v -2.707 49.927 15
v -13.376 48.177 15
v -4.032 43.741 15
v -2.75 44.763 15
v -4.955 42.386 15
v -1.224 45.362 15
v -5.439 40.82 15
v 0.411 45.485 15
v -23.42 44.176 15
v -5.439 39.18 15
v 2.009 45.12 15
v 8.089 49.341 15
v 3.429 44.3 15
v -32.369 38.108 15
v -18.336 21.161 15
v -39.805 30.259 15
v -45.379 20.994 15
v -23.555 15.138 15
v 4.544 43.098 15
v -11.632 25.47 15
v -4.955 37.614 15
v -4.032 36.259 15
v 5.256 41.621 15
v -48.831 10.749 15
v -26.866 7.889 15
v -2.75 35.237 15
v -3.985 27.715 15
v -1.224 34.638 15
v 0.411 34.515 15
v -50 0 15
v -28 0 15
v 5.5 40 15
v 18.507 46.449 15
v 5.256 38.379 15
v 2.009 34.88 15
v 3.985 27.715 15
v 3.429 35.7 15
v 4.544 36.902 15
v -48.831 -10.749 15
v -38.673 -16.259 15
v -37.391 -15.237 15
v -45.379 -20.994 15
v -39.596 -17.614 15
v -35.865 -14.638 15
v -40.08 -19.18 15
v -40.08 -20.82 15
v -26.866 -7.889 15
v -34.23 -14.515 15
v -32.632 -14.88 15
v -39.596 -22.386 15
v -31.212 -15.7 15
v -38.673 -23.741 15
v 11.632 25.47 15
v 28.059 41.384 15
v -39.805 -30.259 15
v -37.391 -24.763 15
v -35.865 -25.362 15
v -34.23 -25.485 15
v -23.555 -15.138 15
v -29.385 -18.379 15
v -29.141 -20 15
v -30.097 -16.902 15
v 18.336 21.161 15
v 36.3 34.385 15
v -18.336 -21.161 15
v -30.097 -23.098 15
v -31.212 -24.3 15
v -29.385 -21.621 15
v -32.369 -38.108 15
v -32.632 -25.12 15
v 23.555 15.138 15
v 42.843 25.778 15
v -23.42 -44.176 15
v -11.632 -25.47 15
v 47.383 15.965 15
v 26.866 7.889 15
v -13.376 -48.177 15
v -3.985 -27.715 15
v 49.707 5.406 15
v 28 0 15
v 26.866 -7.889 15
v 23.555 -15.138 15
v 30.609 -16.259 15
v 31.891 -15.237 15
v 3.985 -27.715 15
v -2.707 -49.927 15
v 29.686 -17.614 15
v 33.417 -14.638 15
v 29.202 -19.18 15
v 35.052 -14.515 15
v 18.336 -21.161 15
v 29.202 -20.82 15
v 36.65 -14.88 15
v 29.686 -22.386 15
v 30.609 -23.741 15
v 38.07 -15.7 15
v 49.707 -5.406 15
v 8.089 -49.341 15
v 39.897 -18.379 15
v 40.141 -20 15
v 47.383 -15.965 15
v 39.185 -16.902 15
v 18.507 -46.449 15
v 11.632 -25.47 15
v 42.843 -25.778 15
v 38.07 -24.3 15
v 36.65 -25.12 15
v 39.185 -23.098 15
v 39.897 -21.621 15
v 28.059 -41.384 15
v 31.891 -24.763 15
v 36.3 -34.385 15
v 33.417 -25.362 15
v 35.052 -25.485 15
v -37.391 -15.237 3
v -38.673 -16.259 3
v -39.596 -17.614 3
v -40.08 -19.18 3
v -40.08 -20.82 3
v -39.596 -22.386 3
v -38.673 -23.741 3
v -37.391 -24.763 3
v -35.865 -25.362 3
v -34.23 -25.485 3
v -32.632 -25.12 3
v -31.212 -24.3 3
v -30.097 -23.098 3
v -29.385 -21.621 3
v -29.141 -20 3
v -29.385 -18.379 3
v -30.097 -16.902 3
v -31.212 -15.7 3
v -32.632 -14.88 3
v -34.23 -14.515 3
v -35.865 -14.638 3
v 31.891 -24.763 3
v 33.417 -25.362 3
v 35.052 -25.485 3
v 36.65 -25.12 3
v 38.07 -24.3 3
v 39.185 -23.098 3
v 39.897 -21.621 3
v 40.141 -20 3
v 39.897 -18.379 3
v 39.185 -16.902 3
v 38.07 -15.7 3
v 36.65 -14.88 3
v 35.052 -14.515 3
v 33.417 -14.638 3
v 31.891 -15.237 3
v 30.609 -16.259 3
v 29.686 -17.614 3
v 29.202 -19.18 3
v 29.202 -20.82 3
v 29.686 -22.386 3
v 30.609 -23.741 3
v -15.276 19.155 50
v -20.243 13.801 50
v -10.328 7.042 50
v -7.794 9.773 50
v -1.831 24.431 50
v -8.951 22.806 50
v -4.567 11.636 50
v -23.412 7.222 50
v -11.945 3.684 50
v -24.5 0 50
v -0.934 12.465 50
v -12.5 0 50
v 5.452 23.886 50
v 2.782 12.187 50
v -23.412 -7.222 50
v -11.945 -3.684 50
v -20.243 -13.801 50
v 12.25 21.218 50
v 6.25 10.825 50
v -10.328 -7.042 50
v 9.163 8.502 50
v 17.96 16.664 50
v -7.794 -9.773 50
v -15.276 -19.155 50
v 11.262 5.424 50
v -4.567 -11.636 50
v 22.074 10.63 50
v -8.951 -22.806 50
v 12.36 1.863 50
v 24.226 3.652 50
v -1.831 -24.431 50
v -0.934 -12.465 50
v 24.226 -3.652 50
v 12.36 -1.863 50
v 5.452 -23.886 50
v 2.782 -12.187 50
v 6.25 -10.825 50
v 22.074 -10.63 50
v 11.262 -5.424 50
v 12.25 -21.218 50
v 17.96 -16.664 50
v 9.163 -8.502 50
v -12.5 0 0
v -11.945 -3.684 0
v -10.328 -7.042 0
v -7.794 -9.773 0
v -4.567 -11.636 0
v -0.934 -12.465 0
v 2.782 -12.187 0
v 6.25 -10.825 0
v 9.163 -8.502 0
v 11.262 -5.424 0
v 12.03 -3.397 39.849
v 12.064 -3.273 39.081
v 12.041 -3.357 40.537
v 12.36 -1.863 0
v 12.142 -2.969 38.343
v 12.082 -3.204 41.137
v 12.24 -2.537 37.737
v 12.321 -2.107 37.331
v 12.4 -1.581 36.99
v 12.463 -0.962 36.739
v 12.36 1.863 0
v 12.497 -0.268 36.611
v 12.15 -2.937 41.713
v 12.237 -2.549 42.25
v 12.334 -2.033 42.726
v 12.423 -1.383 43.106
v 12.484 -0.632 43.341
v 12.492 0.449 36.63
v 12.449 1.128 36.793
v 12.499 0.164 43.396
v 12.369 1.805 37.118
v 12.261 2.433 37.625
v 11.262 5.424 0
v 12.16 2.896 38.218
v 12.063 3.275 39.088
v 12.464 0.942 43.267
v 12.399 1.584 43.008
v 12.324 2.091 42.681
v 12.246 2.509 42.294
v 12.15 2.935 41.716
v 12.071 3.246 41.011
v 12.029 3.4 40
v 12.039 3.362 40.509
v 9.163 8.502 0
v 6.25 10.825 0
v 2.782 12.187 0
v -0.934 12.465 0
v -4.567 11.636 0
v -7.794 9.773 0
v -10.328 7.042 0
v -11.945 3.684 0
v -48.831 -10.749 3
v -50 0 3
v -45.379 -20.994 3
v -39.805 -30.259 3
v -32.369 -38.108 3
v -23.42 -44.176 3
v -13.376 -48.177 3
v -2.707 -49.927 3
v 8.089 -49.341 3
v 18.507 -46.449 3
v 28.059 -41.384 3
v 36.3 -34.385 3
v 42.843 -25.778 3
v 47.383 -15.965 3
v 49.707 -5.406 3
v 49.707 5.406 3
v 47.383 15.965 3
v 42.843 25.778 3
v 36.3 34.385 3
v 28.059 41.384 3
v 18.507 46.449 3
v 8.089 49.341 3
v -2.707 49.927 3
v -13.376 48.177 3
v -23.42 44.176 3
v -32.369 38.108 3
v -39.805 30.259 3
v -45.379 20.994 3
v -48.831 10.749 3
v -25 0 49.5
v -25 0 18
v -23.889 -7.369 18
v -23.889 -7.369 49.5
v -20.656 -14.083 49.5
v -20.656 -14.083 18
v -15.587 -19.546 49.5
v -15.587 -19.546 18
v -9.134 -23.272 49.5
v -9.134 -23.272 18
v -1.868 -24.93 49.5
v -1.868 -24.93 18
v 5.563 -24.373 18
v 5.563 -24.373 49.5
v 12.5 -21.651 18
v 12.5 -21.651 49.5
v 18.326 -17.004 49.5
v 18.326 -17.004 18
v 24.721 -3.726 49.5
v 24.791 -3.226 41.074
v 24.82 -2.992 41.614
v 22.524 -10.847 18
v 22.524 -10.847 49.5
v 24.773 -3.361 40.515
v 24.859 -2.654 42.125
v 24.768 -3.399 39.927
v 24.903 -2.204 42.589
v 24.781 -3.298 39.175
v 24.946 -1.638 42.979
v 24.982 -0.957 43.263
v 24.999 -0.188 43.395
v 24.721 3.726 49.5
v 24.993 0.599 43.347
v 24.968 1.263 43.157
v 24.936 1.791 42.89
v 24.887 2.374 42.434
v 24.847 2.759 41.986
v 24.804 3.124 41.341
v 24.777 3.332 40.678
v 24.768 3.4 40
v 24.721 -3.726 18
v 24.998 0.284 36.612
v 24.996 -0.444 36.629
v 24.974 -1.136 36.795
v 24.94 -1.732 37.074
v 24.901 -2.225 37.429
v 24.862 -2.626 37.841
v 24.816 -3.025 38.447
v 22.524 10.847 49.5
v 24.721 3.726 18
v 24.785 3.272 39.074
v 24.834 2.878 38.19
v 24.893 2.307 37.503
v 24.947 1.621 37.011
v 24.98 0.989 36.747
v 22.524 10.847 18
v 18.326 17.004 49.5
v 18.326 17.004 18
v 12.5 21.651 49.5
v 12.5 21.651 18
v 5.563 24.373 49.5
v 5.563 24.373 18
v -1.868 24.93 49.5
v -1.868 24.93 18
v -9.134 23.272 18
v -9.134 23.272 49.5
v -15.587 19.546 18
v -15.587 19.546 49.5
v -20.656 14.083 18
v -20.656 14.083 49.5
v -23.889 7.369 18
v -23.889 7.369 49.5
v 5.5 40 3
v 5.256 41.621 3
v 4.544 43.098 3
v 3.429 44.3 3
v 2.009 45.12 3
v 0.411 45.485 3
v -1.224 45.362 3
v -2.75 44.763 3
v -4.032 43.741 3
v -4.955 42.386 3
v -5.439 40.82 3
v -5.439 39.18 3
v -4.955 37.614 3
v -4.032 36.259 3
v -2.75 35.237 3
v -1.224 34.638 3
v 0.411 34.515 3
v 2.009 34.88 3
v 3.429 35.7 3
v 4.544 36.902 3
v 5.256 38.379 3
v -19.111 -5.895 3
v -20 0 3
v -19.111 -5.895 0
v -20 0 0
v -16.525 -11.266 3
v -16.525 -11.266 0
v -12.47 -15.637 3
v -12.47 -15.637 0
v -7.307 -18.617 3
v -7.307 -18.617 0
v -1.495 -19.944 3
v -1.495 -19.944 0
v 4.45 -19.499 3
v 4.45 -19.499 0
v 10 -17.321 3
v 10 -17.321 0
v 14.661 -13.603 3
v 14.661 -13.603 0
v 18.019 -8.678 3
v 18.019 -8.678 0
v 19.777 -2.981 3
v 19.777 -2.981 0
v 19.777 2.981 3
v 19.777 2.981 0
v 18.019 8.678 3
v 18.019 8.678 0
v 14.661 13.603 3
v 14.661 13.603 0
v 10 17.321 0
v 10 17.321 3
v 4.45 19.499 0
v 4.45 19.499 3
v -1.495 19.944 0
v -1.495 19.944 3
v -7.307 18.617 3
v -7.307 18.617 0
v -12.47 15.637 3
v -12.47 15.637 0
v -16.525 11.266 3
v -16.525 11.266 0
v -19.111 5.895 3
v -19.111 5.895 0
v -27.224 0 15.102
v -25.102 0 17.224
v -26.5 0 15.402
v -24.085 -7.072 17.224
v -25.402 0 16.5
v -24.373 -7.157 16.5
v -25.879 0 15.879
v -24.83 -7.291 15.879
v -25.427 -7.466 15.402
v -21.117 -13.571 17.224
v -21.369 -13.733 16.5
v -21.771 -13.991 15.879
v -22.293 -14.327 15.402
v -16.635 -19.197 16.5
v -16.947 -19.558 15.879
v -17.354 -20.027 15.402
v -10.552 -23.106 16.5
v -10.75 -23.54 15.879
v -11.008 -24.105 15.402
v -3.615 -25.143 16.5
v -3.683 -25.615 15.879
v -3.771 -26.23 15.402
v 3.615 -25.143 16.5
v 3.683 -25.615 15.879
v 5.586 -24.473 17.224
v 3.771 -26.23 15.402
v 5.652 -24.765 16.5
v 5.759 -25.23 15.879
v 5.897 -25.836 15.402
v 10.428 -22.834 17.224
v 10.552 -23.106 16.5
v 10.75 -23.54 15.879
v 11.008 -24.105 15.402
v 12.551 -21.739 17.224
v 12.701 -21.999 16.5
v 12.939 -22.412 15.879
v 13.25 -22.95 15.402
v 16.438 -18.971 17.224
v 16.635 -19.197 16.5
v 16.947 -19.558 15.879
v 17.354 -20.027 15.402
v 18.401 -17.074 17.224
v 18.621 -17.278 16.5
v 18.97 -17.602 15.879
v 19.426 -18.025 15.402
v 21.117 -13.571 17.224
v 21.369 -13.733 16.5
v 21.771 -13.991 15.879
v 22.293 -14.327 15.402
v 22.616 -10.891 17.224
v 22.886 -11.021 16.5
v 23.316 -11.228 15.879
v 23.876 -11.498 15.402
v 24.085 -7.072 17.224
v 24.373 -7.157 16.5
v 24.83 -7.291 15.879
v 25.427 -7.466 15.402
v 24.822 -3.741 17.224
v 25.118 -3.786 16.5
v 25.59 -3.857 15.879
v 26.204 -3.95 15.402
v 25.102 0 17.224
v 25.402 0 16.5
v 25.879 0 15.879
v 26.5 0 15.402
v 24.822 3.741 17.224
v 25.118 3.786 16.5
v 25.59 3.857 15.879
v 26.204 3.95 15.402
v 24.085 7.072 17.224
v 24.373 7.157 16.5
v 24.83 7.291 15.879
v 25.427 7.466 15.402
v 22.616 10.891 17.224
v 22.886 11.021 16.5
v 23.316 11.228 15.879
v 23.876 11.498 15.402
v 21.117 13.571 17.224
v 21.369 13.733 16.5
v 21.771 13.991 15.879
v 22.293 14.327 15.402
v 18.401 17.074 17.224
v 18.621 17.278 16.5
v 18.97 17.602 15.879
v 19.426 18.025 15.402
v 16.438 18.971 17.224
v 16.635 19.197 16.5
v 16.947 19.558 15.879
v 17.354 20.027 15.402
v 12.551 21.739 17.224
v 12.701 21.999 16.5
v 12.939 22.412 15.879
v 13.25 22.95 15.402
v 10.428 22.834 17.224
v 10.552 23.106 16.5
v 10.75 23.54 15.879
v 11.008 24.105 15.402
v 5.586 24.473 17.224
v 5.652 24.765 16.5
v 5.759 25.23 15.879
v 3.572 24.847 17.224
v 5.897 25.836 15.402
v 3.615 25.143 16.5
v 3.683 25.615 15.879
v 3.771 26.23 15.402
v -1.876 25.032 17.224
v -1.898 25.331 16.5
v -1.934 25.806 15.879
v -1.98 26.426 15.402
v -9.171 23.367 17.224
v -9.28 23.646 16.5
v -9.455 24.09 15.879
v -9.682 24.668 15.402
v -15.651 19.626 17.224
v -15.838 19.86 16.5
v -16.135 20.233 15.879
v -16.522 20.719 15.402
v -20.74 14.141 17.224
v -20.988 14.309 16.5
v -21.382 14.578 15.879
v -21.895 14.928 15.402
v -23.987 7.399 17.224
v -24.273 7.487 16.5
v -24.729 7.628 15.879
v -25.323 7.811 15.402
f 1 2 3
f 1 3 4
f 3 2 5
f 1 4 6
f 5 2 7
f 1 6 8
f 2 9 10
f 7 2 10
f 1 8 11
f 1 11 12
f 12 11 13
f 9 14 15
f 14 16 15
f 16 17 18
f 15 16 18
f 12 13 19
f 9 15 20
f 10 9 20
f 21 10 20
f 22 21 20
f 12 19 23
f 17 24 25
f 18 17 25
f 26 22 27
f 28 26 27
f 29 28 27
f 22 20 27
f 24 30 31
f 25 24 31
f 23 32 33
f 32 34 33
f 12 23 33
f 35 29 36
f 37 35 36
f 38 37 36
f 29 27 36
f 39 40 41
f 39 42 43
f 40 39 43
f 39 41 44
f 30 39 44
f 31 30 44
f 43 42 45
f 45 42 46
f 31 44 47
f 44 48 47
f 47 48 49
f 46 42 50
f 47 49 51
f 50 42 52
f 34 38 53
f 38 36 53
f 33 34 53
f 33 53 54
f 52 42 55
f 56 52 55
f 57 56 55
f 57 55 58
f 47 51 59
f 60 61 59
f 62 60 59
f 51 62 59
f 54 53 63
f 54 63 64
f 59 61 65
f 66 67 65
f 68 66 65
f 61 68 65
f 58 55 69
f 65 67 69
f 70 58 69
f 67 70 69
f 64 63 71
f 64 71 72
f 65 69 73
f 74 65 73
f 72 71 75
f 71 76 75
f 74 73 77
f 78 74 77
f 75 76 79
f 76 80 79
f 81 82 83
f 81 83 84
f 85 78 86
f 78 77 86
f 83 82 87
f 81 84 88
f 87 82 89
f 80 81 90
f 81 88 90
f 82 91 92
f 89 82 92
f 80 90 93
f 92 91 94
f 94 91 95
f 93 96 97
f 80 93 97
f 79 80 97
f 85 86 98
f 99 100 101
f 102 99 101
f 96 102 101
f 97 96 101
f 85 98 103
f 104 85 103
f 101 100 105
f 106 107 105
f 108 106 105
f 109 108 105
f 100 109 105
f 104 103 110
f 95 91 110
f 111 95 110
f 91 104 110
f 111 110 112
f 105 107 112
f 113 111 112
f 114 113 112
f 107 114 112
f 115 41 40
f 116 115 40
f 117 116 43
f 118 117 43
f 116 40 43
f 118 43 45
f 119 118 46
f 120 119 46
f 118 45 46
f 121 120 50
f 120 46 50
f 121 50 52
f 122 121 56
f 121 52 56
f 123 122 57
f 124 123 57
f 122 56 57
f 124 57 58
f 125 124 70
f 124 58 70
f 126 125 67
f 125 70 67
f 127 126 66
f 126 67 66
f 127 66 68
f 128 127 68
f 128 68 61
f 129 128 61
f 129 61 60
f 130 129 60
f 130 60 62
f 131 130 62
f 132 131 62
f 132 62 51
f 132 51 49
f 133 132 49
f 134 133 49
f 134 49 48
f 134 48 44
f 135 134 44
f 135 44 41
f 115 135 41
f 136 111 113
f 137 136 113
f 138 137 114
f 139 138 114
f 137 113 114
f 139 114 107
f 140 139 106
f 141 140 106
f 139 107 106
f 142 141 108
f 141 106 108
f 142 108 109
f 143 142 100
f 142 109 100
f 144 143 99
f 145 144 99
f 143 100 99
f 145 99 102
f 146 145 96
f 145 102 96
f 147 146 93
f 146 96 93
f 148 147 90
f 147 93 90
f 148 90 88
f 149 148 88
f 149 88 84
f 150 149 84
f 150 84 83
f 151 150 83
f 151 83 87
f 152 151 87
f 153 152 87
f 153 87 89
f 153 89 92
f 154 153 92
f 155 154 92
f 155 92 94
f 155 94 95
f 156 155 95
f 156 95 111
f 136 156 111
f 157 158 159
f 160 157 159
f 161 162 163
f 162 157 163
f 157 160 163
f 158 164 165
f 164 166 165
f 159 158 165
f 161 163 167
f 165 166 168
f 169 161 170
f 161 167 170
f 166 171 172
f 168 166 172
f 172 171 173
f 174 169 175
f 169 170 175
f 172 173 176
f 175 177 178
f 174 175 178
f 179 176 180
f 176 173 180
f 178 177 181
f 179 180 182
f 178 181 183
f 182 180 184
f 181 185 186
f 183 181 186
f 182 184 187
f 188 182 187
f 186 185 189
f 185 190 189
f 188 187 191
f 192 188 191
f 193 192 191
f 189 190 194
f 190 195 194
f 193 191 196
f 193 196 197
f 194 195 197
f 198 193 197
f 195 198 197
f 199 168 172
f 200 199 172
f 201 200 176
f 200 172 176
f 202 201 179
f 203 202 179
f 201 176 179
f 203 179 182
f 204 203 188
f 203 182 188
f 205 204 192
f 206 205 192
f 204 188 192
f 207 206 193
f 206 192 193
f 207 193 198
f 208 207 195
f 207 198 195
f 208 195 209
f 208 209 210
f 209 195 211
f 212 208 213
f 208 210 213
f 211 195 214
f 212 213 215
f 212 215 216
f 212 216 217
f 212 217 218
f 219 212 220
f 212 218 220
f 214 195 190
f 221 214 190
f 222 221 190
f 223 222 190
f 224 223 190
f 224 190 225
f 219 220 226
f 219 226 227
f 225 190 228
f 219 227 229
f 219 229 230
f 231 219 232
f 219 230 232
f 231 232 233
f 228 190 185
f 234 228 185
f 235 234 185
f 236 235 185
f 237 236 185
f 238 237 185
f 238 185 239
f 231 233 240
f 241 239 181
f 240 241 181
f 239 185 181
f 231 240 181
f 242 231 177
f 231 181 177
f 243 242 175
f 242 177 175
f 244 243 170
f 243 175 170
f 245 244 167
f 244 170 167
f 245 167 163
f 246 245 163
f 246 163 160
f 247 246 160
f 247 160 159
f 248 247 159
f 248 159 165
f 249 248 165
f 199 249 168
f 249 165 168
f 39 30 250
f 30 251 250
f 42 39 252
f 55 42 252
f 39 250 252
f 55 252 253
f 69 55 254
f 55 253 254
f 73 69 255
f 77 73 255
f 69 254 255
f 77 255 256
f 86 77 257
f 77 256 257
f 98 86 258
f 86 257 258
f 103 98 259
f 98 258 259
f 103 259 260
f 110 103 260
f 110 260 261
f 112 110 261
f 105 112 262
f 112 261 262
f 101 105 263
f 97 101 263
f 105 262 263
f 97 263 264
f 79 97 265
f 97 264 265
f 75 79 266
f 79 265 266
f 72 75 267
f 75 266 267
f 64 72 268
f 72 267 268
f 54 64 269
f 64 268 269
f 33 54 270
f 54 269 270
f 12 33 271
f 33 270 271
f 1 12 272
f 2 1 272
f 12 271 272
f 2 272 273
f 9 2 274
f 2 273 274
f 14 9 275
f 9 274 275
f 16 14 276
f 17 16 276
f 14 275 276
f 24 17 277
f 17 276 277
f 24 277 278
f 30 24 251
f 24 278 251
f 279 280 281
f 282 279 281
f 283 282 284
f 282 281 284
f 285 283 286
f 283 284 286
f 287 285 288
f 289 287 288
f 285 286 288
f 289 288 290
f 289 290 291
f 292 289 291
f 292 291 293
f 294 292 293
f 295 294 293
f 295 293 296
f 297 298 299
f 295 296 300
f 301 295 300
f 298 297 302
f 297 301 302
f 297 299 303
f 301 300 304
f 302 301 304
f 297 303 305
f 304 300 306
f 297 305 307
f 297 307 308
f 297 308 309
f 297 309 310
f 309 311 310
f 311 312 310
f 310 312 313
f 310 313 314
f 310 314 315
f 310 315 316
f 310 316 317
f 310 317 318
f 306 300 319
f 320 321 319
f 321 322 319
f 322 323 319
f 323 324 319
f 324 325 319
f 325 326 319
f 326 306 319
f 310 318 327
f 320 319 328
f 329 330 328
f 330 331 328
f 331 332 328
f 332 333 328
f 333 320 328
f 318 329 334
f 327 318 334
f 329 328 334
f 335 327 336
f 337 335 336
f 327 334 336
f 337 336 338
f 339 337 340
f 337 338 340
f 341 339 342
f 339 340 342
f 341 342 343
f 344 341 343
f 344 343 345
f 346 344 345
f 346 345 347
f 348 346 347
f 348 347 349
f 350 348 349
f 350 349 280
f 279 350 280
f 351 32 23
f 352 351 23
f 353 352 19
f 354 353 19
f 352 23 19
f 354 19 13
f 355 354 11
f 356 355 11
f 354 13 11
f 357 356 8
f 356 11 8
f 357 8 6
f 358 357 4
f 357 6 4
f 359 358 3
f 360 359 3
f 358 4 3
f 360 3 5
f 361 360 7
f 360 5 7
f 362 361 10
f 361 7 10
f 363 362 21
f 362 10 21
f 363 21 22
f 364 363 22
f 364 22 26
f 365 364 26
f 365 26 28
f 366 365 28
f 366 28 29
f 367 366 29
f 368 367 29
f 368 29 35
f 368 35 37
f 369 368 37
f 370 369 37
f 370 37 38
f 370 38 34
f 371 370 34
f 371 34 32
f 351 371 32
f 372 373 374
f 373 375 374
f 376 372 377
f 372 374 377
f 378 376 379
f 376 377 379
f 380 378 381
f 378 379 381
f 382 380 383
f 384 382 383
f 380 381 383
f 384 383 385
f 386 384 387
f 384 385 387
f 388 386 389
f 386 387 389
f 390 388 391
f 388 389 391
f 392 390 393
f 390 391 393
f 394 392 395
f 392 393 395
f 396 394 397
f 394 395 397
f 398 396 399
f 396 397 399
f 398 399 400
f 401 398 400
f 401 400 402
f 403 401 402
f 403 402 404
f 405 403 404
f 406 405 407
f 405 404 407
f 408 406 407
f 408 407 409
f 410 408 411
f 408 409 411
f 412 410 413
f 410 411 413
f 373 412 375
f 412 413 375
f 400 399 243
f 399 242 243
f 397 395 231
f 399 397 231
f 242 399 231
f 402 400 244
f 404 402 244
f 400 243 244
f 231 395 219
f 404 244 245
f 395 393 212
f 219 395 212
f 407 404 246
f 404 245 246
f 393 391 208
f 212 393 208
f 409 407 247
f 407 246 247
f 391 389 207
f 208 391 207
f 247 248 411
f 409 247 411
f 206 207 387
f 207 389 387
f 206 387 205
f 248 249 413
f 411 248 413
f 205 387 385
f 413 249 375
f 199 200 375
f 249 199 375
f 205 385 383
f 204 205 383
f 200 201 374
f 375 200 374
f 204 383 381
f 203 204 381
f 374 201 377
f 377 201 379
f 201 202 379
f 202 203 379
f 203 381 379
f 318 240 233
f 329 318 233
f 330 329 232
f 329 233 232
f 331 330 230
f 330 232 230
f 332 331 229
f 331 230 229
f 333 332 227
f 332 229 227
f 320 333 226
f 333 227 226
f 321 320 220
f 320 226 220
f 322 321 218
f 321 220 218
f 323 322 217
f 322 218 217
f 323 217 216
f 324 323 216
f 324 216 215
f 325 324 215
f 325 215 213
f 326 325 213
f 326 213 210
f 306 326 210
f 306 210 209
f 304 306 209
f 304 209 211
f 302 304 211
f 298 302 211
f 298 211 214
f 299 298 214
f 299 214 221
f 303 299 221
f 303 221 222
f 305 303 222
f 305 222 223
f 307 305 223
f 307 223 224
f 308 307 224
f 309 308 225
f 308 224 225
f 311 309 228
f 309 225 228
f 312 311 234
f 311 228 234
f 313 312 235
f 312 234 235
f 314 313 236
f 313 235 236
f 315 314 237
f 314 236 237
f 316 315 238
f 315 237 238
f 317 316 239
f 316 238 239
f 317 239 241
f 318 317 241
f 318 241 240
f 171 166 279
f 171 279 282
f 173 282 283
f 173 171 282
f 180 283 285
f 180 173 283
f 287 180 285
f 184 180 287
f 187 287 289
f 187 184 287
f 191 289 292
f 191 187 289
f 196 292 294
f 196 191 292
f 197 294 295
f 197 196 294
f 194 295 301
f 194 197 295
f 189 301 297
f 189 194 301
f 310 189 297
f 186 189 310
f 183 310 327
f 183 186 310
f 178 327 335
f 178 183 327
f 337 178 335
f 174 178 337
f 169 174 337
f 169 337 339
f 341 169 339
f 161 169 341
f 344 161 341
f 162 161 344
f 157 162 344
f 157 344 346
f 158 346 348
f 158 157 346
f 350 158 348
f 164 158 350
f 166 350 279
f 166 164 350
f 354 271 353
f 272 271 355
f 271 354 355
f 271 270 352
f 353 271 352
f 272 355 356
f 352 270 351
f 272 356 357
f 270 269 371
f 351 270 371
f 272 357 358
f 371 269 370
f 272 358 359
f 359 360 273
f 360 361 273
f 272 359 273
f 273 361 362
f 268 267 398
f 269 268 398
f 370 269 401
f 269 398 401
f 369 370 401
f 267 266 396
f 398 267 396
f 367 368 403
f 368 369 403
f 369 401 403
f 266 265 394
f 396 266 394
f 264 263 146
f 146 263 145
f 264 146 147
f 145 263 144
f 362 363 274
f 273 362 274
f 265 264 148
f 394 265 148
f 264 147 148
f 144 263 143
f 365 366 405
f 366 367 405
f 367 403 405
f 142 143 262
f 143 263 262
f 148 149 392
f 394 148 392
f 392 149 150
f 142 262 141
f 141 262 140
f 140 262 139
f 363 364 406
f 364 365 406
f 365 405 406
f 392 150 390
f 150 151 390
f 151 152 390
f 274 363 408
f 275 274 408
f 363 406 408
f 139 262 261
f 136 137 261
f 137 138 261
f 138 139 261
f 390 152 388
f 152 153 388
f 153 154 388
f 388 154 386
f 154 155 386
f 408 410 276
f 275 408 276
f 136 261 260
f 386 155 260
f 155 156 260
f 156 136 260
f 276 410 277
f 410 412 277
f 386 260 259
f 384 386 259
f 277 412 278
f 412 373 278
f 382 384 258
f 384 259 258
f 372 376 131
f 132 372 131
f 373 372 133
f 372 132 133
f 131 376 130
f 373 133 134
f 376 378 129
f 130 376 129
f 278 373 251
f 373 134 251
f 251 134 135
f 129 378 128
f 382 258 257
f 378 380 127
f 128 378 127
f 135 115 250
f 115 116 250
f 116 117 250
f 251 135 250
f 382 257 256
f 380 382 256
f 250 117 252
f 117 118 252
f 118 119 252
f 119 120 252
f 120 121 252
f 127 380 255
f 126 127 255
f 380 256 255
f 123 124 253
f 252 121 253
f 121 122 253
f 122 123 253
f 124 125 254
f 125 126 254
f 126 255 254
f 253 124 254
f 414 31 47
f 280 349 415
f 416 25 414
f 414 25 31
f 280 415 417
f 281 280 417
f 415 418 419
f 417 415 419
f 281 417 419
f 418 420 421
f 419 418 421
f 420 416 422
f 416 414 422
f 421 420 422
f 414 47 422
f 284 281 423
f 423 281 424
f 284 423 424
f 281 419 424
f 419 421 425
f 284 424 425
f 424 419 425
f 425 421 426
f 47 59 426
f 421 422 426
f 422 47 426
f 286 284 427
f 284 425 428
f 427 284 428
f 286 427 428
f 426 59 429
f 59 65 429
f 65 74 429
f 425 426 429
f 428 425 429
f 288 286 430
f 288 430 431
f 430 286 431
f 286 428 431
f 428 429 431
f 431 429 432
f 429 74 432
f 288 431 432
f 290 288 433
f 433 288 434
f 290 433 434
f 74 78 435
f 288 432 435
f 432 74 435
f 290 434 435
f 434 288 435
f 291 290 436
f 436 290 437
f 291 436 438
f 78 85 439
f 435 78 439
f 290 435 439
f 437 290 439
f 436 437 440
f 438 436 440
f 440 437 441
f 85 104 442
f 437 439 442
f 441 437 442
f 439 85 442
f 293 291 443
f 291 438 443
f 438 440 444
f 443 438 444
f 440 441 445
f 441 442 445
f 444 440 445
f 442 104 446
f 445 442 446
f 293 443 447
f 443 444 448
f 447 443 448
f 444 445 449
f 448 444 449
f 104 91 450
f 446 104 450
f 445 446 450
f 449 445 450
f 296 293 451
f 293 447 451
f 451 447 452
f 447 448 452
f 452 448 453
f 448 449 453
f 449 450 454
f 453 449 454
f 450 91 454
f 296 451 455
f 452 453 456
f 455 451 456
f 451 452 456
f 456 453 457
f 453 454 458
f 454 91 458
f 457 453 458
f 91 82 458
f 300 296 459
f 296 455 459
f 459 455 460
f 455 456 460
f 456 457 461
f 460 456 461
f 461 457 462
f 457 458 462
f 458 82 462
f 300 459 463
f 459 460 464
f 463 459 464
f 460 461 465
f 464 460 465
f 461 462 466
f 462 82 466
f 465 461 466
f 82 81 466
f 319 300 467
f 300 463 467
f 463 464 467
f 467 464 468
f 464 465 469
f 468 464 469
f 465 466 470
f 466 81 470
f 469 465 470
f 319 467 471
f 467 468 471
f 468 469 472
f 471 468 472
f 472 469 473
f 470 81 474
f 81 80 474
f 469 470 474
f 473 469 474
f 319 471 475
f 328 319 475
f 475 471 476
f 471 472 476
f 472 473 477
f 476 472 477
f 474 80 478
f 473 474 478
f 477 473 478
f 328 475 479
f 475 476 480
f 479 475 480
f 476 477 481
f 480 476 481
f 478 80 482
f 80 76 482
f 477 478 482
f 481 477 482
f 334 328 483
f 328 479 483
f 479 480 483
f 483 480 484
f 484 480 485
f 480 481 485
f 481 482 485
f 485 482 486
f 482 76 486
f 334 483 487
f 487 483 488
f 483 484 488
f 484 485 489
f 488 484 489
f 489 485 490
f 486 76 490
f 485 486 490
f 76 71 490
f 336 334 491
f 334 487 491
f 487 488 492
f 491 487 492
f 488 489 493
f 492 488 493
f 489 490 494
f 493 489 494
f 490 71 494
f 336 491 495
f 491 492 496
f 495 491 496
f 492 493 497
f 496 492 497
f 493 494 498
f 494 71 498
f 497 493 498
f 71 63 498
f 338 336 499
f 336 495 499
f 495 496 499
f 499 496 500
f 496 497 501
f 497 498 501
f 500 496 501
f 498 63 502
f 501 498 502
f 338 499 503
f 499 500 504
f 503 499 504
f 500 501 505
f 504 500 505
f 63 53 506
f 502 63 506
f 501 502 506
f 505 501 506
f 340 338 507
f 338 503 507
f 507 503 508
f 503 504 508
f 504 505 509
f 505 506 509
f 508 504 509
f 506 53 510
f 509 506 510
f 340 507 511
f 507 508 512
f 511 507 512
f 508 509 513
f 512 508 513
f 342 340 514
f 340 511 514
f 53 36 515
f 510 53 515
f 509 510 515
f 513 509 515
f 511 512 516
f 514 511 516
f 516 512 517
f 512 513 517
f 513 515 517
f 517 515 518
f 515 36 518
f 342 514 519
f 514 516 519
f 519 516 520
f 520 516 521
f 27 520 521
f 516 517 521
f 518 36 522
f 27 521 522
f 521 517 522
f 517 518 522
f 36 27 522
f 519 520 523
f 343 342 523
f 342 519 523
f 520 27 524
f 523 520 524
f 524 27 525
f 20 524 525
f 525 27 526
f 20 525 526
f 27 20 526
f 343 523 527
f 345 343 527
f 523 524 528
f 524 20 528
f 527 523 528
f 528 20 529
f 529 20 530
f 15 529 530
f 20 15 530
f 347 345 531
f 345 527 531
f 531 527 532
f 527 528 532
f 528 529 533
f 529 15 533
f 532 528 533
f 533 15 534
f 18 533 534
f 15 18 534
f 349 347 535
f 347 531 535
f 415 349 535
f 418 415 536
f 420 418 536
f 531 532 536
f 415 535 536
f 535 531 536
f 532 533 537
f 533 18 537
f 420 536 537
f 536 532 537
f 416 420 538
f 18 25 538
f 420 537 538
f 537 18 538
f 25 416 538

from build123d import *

# Parameters (mm, degrees)
F2_R            = 3
F4_D            = 6.8
F4_DEPTH        = 50.001
F5_R            = 5.5
F6_DEPTH        = 15.0010001
F6_COPIES_COUNT = 3
F7_SIZE         = 0.5


# Not quite as in the source:
# - a pattern or mirror of a feature is missing from the dataset's text; its kind, count and spacing are read off the source's solid


with BuildPart() as f1:
    # F0 (on Front) → F1 (revolve)
    with BuildSketch(Plane.XZ):
        Polygon((-20, 0), (-12.5, 0), (-12.5, 50), (-25, 50), (-25, 15), (-50, 15), (-50, 3), (-20, 3), align=None)
    revolve(axis=Axis((0, 0, 33.7237479181), (0, 0, 1)))

    # F2
    f2_edges = [f1.edges().sort_by_distance(p)[0] for p in [
        (25, 0, 15),
    ]]
    fillet(f2_edges, radius=F2_R)

    # F4 (through all, one way)
    with BuildSketch(Plane(origin=(0, 0, 0), x_dir=(0, 1, 0), z_dir=(-1, 0, 0))):
        with Locations((0, -40)):
            Circle(F4_D / 2)
    extrude(amount=-F4_DEPTH, mode=Mode.SUBTRACT)

    # F5 (on face) → F6 (cut, through all)
    with BuildSketch(Plane.XY.offset(15)):
        with Locations((0, 40)):
            Circle(F5_R)
    f6 = extrude(amount=-F6_DEPTH, mode=Mode.SUBTRACT)

    # F6_copies: F6 ×3 about axis
    f6_copies_axis = Axis((0, 0, 0), (0, 0, 1))
    for i in range(1, F6_COPIES_COUNT):
        add(f6.rotate(f6_copies_axis, i * 360 / F6_COPIES_COUNT), mode=Mode.SUBTRACT)

    # F7
    f7_edges = [f1.edges().sort_by_distance(p)[0] for p in [
        (25, 0, 50),
    ]]
    chamfer(f7_edges, length=F7_SIZE)


solid = f1.part
